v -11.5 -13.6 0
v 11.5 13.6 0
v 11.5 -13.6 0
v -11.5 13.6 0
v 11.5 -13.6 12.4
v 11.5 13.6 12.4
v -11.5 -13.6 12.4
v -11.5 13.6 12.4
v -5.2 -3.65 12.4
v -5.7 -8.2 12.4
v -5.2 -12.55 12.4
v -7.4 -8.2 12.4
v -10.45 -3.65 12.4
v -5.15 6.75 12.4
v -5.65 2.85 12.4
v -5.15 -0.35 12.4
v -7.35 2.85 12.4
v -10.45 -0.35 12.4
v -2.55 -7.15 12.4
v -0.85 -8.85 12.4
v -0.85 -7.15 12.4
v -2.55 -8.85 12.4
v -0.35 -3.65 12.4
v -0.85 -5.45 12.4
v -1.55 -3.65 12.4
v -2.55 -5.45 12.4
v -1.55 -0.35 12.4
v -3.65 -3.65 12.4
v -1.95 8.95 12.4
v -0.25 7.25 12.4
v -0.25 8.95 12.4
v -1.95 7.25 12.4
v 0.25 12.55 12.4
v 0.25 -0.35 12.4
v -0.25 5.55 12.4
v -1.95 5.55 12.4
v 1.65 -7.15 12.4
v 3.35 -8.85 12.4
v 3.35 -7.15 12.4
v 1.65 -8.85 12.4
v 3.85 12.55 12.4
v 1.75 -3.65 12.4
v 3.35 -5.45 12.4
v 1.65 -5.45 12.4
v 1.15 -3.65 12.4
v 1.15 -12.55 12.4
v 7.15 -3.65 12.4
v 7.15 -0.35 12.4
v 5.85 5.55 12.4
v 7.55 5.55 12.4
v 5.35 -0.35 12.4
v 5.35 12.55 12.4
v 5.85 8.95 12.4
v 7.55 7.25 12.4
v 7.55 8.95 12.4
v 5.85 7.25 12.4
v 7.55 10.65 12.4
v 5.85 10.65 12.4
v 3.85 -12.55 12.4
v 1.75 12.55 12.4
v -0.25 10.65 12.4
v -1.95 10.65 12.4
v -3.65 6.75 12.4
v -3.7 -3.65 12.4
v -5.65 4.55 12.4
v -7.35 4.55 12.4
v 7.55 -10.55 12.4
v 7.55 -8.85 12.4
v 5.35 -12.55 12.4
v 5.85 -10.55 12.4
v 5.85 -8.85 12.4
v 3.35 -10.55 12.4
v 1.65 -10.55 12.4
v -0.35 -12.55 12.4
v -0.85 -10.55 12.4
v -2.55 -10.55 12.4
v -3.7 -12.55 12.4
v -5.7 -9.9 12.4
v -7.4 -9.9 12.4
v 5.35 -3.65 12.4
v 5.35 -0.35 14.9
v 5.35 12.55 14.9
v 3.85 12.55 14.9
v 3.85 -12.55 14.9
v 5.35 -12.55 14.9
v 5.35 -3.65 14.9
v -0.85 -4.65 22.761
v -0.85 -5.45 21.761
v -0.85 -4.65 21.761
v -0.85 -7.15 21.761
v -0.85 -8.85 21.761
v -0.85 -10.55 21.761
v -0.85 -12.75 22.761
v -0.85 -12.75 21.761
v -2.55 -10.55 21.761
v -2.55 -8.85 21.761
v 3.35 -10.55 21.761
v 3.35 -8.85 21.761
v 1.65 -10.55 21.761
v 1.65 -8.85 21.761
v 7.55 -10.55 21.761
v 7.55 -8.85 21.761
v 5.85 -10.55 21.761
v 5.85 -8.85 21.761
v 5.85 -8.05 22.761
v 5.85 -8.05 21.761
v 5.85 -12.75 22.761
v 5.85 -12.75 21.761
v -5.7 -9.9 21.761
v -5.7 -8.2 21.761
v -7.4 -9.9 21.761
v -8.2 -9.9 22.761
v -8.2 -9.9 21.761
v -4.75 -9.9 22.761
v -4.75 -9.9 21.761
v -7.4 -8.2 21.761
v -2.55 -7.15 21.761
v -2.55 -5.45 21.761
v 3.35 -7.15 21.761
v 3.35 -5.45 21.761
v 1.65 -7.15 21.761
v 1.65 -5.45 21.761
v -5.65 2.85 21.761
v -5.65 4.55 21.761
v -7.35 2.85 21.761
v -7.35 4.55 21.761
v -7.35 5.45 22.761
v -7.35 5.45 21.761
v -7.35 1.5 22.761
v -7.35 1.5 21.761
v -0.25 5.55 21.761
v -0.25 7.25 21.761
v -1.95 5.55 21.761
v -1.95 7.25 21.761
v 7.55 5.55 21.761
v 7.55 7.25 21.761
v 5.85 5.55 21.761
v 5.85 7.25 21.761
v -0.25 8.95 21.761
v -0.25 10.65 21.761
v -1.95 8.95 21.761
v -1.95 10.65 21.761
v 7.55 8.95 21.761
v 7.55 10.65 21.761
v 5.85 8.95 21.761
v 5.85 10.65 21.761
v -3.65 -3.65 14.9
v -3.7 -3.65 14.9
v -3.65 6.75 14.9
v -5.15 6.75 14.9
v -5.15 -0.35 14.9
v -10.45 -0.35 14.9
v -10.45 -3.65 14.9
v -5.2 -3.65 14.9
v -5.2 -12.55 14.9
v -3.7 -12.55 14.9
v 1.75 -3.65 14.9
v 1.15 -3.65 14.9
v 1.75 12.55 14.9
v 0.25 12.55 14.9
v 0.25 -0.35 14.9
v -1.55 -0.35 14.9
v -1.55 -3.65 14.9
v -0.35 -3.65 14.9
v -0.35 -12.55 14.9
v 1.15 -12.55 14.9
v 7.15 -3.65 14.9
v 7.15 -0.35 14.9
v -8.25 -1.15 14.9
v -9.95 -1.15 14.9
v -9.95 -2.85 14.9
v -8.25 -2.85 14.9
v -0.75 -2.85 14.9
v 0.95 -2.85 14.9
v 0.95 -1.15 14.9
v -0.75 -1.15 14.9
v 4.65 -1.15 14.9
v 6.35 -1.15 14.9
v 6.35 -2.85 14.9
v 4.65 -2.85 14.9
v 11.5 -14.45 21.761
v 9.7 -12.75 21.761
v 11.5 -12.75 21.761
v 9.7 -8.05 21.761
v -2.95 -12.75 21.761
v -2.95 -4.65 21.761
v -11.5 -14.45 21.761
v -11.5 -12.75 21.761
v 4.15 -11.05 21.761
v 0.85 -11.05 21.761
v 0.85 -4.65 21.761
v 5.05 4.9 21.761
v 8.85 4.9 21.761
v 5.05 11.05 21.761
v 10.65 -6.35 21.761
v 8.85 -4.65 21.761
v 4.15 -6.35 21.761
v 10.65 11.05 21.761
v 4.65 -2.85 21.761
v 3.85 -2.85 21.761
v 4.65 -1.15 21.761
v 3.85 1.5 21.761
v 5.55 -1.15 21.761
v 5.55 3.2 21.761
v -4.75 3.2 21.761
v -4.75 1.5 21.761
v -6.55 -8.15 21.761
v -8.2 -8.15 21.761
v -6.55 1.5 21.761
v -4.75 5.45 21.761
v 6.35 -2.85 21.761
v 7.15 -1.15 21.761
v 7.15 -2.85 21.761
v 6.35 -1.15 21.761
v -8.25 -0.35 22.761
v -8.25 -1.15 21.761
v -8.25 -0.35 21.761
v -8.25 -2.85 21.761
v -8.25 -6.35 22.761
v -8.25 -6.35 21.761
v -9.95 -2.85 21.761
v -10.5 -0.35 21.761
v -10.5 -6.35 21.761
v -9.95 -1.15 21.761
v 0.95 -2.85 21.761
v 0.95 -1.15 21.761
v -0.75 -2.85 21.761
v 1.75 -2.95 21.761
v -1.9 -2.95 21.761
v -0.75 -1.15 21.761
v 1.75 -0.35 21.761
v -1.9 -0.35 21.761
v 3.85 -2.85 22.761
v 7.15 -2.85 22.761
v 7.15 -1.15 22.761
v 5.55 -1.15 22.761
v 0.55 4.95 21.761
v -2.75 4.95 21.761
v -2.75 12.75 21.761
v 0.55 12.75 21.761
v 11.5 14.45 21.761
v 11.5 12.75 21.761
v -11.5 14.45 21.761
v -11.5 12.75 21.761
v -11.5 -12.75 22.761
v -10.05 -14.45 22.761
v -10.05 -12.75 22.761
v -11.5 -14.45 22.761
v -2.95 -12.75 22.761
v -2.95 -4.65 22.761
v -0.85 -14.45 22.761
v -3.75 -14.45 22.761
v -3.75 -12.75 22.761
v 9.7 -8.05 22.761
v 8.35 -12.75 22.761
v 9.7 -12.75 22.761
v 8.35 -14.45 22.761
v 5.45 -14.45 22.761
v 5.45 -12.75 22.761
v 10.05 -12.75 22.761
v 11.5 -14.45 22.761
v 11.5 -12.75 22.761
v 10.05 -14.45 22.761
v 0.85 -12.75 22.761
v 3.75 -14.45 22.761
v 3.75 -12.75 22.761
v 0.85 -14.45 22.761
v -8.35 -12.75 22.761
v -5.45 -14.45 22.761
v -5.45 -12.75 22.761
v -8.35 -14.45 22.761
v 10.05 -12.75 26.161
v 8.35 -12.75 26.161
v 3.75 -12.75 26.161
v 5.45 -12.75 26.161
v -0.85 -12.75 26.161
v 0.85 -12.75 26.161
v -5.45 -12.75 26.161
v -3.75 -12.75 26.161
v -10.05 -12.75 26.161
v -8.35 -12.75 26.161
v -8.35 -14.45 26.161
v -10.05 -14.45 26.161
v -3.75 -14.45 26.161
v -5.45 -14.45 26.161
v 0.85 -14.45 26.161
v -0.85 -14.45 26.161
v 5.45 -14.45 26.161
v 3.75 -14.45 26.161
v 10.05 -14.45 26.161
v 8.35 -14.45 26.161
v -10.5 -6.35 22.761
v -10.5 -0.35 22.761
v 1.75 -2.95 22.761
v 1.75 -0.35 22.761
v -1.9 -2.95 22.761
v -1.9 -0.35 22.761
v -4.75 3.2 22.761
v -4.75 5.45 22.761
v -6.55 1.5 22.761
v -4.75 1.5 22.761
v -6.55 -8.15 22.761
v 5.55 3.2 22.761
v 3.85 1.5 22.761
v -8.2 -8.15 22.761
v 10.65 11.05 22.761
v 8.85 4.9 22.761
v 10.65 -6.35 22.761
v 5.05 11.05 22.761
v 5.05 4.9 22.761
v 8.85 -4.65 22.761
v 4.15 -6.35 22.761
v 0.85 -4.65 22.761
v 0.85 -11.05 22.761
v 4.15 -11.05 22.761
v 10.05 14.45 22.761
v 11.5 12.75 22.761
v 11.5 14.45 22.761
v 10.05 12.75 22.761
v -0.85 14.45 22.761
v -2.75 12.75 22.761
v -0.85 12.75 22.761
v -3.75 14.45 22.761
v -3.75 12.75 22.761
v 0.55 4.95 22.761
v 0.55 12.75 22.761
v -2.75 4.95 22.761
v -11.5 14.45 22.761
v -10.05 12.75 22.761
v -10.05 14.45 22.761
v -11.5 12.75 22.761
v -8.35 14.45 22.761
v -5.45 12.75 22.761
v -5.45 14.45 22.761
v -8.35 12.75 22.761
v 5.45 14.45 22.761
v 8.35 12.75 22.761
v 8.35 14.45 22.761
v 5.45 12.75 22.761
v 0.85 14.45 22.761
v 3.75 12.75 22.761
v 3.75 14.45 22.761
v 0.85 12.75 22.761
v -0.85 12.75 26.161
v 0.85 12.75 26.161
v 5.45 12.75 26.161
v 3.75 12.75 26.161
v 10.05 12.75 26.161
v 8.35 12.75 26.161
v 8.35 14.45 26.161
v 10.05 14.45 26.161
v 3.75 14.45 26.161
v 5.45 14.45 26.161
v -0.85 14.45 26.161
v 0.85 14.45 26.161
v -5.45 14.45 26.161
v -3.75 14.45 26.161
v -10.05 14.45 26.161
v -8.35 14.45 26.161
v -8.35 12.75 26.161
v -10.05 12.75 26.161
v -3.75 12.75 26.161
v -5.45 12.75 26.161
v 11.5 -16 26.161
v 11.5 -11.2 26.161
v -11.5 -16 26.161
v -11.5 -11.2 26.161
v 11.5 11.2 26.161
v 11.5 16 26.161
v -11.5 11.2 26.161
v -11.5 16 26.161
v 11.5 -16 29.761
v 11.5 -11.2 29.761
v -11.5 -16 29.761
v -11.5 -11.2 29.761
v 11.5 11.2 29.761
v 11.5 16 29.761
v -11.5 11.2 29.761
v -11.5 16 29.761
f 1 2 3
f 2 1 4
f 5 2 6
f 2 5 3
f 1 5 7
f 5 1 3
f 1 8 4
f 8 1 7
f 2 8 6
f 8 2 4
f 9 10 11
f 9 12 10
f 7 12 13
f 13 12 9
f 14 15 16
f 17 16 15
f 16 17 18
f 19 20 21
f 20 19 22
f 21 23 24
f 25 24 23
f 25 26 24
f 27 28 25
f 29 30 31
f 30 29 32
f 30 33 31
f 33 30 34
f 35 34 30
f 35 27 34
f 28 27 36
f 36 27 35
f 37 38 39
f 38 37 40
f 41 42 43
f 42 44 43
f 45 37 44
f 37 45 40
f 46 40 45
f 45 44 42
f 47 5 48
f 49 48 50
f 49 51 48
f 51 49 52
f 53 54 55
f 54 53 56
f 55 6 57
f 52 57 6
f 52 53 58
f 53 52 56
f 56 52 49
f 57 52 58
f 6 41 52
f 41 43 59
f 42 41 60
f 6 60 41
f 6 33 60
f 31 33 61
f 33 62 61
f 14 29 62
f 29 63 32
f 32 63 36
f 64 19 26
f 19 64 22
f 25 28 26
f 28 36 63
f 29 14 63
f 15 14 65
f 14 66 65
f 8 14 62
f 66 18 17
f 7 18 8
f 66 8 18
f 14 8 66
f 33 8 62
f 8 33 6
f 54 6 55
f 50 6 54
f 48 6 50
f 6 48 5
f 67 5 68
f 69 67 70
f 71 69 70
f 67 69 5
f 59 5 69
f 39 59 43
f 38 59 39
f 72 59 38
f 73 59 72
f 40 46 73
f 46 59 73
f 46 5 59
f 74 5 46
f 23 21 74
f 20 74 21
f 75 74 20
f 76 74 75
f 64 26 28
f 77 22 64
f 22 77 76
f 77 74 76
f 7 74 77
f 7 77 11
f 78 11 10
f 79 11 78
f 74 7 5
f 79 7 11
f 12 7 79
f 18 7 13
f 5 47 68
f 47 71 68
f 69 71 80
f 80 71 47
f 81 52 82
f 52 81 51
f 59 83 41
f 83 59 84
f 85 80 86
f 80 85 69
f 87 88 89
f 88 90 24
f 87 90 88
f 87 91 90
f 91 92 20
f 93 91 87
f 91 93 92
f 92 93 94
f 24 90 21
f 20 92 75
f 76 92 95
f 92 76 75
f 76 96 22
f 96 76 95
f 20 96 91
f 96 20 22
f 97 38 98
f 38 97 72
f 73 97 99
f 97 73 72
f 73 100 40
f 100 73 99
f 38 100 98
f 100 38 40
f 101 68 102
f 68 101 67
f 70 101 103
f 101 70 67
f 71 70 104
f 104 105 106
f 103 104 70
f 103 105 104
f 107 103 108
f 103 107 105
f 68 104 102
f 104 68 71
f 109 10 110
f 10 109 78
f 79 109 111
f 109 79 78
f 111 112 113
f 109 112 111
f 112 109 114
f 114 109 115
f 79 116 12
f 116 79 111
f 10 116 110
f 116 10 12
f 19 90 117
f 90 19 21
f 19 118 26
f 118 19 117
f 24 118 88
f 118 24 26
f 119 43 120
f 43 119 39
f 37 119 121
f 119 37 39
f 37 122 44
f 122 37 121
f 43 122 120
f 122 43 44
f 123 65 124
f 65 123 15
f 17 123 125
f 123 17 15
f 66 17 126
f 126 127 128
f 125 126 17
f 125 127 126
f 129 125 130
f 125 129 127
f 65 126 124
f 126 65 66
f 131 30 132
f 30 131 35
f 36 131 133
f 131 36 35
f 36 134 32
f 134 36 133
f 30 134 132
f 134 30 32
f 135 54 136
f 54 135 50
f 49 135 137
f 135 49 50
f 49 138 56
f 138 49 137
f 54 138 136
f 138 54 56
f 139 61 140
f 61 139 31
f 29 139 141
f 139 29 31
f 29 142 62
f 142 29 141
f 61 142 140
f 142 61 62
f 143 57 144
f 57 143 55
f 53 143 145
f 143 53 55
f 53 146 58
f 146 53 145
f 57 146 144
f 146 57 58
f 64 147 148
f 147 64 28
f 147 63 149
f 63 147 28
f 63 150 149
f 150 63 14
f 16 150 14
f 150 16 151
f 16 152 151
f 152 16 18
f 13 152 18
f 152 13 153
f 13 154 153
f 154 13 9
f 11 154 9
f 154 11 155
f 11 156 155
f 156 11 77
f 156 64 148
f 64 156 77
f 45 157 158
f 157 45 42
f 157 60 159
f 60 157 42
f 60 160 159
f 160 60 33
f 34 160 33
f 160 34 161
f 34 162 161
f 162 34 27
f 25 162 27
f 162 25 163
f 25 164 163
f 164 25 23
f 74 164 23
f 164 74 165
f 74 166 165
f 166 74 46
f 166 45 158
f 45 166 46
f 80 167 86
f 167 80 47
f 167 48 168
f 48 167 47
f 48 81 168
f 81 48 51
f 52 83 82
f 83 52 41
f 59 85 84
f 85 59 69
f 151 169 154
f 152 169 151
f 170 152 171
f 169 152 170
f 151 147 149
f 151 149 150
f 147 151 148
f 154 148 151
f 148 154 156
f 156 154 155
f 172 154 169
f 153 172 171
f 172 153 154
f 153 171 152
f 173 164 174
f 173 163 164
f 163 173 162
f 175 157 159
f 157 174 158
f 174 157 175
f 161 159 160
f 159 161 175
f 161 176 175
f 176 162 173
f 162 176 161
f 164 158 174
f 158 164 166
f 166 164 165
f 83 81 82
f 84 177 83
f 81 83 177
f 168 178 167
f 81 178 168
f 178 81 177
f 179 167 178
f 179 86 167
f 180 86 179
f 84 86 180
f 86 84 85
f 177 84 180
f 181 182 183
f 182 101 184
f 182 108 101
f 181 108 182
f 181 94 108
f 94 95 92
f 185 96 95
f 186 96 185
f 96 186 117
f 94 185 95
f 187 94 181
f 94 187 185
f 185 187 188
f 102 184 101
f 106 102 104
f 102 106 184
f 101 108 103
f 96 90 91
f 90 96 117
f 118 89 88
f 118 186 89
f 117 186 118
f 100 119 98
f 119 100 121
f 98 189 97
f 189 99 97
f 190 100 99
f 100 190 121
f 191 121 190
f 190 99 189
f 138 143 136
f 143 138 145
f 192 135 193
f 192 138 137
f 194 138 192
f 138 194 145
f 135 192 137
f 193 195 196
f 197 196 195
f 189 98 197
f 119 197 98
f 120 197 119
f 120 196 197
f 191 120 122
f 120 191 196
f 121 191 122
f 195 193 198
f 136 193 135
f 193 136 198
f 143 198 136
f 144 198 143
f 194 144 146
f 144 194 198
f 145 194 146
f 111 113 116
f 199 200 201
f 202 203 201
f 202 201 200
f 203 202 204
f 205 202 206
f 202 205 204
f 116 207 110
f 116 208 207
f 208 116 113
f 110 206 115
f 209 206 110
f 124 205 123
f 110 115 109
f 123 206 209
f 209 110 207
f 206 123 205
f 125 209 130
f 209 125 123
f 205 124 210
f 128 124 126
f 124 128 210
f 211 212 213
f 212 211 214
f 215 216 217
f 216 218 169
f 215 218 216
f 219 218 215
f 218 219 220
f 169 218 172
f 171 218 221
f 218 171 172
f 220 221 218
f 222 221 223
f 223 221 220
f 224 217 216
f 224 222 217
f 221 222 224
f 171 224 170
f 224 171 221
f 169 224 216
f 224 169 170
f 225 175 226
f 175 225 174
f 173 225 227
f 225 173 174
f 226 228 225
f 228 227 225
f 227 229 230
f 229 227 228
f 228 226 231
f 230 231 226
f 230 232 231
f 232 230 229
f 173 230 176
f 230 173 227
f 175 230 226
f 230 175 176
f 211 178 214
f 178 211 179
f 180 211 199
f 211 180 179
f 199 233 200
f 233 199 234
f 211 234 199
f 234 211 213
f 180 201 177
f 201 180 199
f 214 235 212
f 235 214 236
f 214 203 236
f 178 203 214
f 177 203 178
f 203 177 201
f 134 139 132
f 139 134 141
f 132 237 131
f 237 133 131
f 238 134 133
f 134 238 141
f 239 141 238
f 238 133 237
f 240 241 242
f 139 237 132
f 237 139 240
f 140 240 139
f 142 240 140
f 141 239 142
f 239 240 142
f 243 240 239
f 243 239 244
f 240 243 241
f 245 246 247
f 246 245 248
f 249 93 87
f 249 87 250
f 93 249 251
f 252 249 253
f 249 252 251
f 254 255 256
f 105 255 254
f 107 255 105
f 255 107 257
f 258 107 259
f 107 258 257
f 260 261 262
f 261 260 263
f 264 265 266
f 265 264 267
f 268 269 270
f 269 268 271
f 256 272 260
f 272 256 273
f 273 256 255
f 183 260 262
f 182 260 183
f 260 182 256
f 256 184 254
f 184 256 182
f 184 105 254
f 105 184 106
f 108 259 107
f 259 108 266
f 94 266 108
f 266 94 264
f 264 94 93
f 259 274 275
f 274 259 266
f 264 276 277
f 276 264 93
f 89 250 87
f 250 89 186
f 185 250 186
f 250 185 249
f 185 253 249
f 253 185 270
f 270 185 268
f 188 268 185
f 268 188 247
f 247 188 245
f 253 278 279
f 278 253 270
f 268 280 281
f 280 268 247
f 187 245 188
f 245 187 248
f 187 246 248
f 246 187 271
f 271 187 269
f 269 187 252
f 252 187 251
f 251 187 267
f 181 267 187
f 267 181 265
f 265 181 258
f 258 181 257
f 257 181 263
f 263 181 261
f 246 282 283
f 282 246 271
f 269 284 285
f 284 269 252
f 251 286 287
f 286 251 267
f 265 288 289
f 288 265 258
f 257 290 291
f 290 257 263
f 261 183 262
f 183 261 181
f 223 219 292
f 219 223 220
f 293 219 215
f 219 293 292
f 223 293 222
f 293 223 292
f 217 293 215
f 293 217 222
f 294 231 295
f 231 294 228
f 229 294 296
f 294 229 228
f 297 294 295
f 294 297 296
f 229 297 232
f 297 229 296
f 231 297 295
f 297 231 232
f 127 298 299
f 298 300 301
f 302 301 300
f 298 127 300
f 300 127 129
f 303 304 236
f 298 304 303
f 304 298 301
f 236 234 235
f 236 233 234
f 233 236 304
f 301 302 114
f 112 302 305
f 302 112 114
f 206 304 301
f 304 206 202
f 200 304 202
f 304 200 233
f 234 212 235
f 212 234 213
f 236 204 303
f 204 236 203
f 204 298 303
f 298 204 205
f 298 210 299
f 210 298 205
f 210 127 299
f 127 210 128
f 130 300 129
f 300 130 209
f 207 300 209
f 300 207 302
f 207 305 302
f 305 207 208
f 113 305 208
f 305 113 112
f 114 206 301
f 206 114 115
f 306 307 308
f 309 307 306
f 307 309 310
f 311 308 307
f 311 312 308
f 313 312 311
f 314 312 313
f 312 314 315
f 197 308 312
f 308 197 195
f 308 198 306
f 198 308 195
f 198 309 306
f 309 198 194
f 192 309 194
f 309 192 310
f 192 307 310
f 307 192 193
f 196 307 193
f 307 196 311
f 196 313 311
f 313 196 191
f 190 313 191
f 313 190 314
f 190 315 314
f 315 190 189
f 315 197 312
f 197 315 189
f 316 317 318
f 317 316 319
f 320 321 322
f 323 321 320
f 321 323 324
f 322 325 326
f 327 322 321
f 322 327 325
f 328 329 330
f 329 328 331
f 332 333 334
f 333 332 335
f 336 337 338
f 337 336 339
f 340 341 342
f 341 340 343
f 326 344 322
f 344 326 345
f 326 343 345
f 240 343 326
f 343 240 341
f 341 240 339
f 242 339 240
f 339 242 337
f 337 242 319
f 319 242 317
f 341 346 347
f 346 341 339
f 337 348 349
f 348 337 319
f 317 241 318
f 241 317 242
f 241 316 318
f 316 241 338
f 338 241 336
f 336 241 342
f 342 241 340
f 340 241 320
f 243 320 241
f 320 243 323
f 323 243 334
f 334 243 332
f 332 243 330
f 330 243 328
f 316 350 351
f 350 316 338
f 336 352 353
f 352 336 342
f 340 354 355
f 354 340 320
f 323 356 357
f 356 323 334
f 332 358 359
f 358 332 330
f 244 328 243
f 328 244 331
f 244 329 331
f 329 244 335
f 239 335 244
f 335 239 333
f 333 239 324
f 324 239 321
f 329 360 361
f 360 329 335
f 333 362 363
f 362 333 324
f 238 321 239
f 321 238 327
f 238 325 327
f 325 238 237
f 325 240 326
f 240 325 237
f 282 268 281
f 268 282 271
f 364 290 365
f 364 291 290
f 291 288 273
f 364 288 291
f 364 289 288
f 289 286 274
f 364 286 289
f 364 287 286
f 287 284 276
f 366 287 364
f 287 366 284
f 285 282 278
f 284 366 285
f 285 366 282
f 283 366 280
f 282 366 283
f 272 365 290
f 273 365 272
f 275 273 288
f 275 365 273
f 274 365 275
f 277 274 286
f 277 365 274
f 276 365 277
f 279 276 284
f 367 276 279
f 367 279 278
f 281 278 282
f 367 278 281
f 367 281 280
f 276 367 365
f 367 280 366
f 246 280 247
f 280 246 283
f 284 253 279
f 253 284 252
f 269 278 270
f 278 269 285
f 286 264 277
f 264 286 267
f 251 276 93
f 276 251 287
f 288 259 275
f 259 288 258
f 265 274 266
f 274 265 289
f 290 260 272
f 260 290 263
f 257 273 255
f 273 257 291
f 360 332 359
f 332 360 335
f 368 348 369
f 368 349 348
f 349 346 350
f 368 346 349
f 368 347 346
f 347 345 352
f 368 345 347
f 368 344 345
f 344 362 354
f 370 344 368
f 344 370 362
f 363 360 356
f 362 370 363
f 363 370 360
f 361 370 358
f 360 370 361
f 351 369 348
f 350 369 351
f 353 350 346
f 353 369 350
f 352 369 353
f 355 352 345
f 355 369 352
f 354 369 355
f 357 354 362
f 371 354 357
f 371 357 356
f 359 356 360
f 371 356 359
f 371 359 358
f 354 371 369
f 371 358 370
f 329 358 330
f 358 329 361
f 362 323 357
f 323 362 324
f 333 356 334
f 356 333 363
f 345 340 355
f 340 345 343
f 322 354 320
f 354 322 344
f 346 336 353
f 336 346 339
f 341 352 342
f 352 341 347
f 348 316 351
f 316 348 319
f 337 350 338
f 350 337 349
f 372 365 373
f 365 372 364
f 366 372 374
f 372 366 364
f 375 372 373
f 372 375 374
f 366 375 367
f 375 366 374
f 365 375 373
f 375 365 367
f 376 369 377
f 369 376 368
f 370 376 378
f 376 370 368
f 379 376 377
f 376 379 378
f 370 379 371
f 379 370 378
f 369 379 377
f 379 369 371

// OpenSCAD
// Generated by SolidPython 0.4.2 on 2020-09-29 23:21:09
//!OpenSCAD

scale(v = 0.0100000000) {
	translate(v = [-1150, -1360, 0]) {
		union() {
			color(c = [0.4000000000, 0.4000000000, 0.4000000000]) {
				translate(v = [0, 0, 0]) {
					linear_extrude(height = 1000.0000000000) {
						polygon(paths = [[0, 1, 2, 3]], points = [[0, 0], [0, 2720], [2300, 2720], [2300, 0]]);
					}
				}
			}
			color(c = [0.2000000000, 0.6000000000, 0.2000000000]) {
				translate(v = [0, 0, 1000.0000000000]) {
					linear_extrude(height = 120.0000000000) {
						polygon(paths = [[0, 1, 2, 3]], points = [[0, 1305], [0, 2720], [2300, 2720], [2300, 1305]]);
					}
				}
			}
			color(c = [0.4000000000, 0.4000000000, 0.4000000000]) {
				translate(v = [0, 0, 1000.0000000000]) {
					linear_extrude(height = 120.0000000000) {
						polygon(paths = [[0, 1, 2, 3]], points = [[0, 0], [0, 1305], [2300, 1305], [2300, 0]]);
					}
				}
			}
			color(c = [0.9000000000, 0.6000000000, 0.6000000000]) {
				translate(v = [0, 0, 1120.0000000000]) {
					linear_extrude(height = 120.0000000000) {
						polygon(paths = [[0, 1, 2, 3]], points = [[375, 1485], [375, 1905], [635, 1905], [635, 1485]]);
					}
				}
			}
			color(c = [0.9000000000, 0.6000000000, 0.6000000000]) {
				translate(v = [0, 0, 1120.0000000000]) {
					linear_extrude(height = 120.0000000000) {
						polygon(paths = [[0, 1, 2, 3, 4, 5]], points = [[785, 1485], [785, 1905], [915, 1905], [915, 2485], [1175, 2485], [1175, 1485]]);
					}
				}
			}
			color(c = [0.9000000000, 0.6000000000, 0.6000000000]) {
				translate(v = [0, 0, 1120.0000000000]) {
					linear_extrude(height = 120.0000000000) {
						polygon(paths = [[0, 1, 2, 3]], points = [[1325, 1485], [1325, 2485], [1535, 2485], [1535, 1485]]);
					}
				}
			}
			color(c = [0.9000000000, 0.6000000000, 0.6000000000]) {
				translate(v = [0, 0, 1120.0000000000]) {
					linear_extrude(height = 120.0000000000) {
						polygon(paths = [[0, 1, 2, 3]], points = [[1685, 1485], [1685, 2485], [1945, 2485], [1945, 1485]]);
					}
				}
			}
			color(c = [0.9000000000, 0.6000000000, 0.9000000000]) {
				translate(v = [0, 0, 1120.0000000000]) {
					linear_extrude(height = 120.0000000000) {
						polygon(paths = [[0, 1, 2, 3]], points = [[370, 235], [370, 655], [630, 655], [630, 235]]);
					}
				}
			}
			color(c = [0.9000000000, 0.6000000000, 0.9000000000]) {
				translate(v = [0, 0, 1120.0000000000]) {
					linear_extrude(height = 120.0000000000) {
						polygon(paths = [[0, 1, 2, 3, 4, 5]], points = [[780, 235], [780, 655], [855, 655], [855, 885], [1115, 885], [1115, 235]]);
					}
				}
			}
			color(c = [0.9000000000, 0.6000000000, 0.9000000000]) {
				translate(v = [0, 0, 1120.0000000000]) {
					linear_extrude(height = 120.0000000000) {
						polygon(paths = [[0, 1, 2, 3]], points = [[1265, 235], [1265, 885], [1535, 885], [1535, 235]]);
					}
				}
			}
			color(c = [0.9000000000, 0.6000000000, 0.9000000000]) {
				translate(v = [0, 0, 1120.0000000000]) {
					linear_extrude(height = 120.0000000000) {
						polygon(paths = [[0, 1, 2, 3]], points = [[1685, 235], [1685, 885], [1945, 885], [1945, 235]]);
					}
				}
			}
			color(c = [0.2000000000, 0.6000000000, 0.2000000000]) {
				translate(v = [0, 0, 1120.0000000000]) {
					linear_extrude(height = 120.0000000000) {
						difference() {
							polygon(paths = [[0, 1, 2, 3]], points = [[0, 1305], [0, 2720], [2300, 2720], [2300, 1305]]);
							polygon(paths = [[0, 1, 2, 3]], points = [[375, 1485], [635, 1485], [635, 1905], [375, 1905]]);
							polygon(paths = [[0, 1, 2, 3]], points = [[1325, 1485], [1535, 1485], [1535, 2485], [1325, 2485]]);
							polygon(paths = [[0, 1, 2, 3]], points = [[1685, 1485], [1945, 1485], [1945, 2485], [1685, 2485]]);
							polygon(paths = [[0, 1, 2, 3, 4, 5]], points = [[785, 1485], [1175, 1485], [1175, 2485], [915, 2485], [915, 1905], [785, 1905]]);
						}
					}
				}
			}
			color(c = [0.4000000000, 0.4000000000, 0.4000000000]) {
				translate(v = [0, 0, 1120.0000000000]) {
					linear_extrude(height = 120.0000000000) {
						difference() {
							polygon(paths = [[0, 1, 2, 3]], points = [[0, 0], [0, 1305], [2300, 1305], [2300, 0]]);
							polygon(paths = [[0, 1, 2, 3]], points = [[370, 235], [630, 235], [630, 655], [370, 655]]);
							polygon(paths = [[0, 1, 2, 3]], points = [[1265, 235], [1535, 235], [1535, 885], [1265, 885]]);
							polygon(paths = [[0, 1, 2, 3]], points = [[1685, 235], [1945, 235], [1945, 885], [1685, 885]]);
							polygon(paths = [[0, 1, 2, 3, 4, 5]], points = [[780, 235], [1115, 235], [1115, 885], [855, 885], [855, 655], [780, 655]]);
						}
					}
				}
			}
			color(c = [0.1000000000, 0.1000000000, 0.1000000000]) {
				translate(v = [0, 0, 1240.0000000000]) {
					linear_extrude(height = 70.0000000000) {
						polygon(paths = [[0, 1, 2, 3]], points = [[895, 305], [895, 475], [1065, 475], [1065, 305]]);
					}
				}
			}
			color(c = [0.1000000000, 0.1000000000, 0.1000000000]) {
				translate(v = [0, 0, 1240.0000000000]) {
					linear_extrude(height = 70.0000000000) {
						polygon(paths = [[0, 1, 2, 3]], points = [[1315, 305], [1315, 475], [1485, 475], [1485, 305]]);
					}
				}
			}
			color(c = [0.1000000000, 0.1000000000, 0.1000000000]) {
				translate(v = [0, 0, 1240.0000000000]) {
					linear_extrude(height = 70.0000000000) {
						polygon(paths = [[0, 1, 2, 3]], points = [[1735, 305], [1735, 475], [1905, 475], [1905, 305]]);
					}
				}
			}
			color(c = [0.1000000000, 0.1000000000, 0.1000000000]) {
				translate(v = [0, 0, 1240.0000000000]) {
					linear_extrude(height = 70.0000000000) {
						polygon(paths = [[0, 1, 2, 3]], points = [[410, 370], [410, 540], [580, 540], [580, 370]]);
					}
				}
			}
			color(c = [0.1000000000, 0.1000000000, 0.1000000000]) {
				translate(v = [0, 0, 1240.0000000000]) {
					linear_extrude(height = 70.0000000000) {
						polygon(paths = [[0, 1, 2, 3]], points = [[895, 645], [895, 815], [1065, 815], [1065, 645]]);
					}
				}
			}
			color(c = [0.1000000000, 0.1000000000, 0.1000000000]) {
				translate(v = [0, 0, 1240.0000000000]) {
					linear_extrude(height = 70.0000000000) {
						polygon(paths = [[0, 1, 2, 3]], points = [[1315, 645], [1315, 815], [1485, 815], [1485, 645]]);
					}
				}
			}
			color(c = [0.1000000000, 0.1000000000, 0.1000000000]) {
				translate(v = [0, 0, 1240.0000000000]) {
					linear_extrude(height = 70.0000000000) {
						polygon(paths = [[0, 1, 2, 3]], points = [[415, 1645], [415, 1815], [585, 1815], [585, 1645]]);
					}
				}
			}
			color(c = [0.1000000000, 0.1000000000, 0.1000000000]) {
				translate(v = [0, 0, 1240.0000000000]) {
					linear_extrude(height = 70.0000000000) {
						polygon(paths = [[0, 1, 2, 3]], points = [[955, 1915], [955, 2085], [1125, 2085], [1125, 1915]]);
					}
				}
			}
			color(c = [0.1000000000, 0.1000000000, 0.1000000000]) {
				translate(v = [0, 0, 1240.0000000000]) {
					linear_extrude(height = 70.0000000000) {
						polygon(paths = [[0, 1, 2, 3]], points = [[1735, 1915], [1735, 2085], [1905, 2085], [1905, 1915]]);
					}
				}
			}
			color(c = [0.1000000000, 0.1000000000, 0.1000000000]) {
				translate(v = [0, 0, 1240.0000000000]) {
					linear_extrude(height = 70.0000000000) {
						polygon(paths = [[0, 1, 2, 3]], points = [[955, 2255], [955, 2425], [1125, 2425], [1125, 2255]]);
					}
				}
			}
			color(c = [0.1000000000, 0.1000000000, 0.1000000000]) {
				translate(v = [0, 0, 1240.0000000000]) {
					linear_extrude(height = 70.0000000000) {
						polygon(paths = [[0, 1, 2, 3]], points = [[1735, 2255], [1735, 2425], [1905, 2425], [1905, 2255]]);
					}
				}
			}
			color(c = [1.0000000000, 1.0000000000, 1.0000000000]) {
				translate(v = [0, 0, 1240.0000000000]) {
					linear_extrude(height = 70.0000000000) {
						polygon(paths = [[0, 1, 2, 3, 4, 5, 6, 7, 8, 9]], points = [[630, 105], [630, 995], [105, 995], [105, 1325], [635, 1325], [635, 2035], [785, 2035], [785, 995], [780, 995], [780, 105]]);
					}
				}
			}
			color(c = [1.0000000000, 1.0000000000, 1.0000000000]) {
				translate(v = [0, 0, 1240.0000000000]) {
					linear_extrude(height = 70.0000000000) {
						polygon(paths = [[0, 1, 2, 3, 4, 5, 6, 7, 8, 9]], points = [[1115, 105], [1115, 995], [995, 995], [995, 1325], [1175, 1325], [1175, 2615], [1325, 2615], [1325, 995], [1265, 995], [1265, 105]]);
					}
				}
			}
			color(c = [1.0000000000, 1.0000000000, 1.0000000000]) {
				translate(v = [0, 0, 1240.0000000000]) {
					linear_extrude(height = 70.0000000000) {
						polygon(paths = [[0, 1, 2, 3, 4, 5, 6, 7]], points = [[1535, 105], [1535, 2615], [1685, 2615], [1685, 1325], [1865, 1325], [1865, 995], [1685, 995], [1685, 105]]);
					}
				}
			}
			color(c = [0.1000000000, 0.1000000000, 0.1000000000]) {
				translate(v = [0, 0, 1310.0000000000]) {
					linear_extrude(height = 180.0000000000) {
						polygon(paths = [[0, 1, 2, 3]], points = [[895, 305], [895, 475], [1065, 475], [1065, 305]]);
					}
				}
			}
			color(c = [0.1000000000, 0.1000000000, 0.1000000000]) {
				translate(v = [0, 0, 1310.0000000000]) {
					linear_extrude(height = 180.0000000000) {
						polygon(paths = [[0, 1, 2, 3]], points = [[1315, 305], [1315, 475], [1485, 475], [1485, 305]]);
					}
				}
			}
			color(c = [0.1000000000, 0.1000000000, 0.1000000000]) {
				translate(v = [0, 0, 1310.0000000000]) {
					linear_extrude(height = 180.0000000000) {
						polygon(paths = [[0, 1, 2, 3]], points = [[1735, 305], [1735, 475], [1905, 475], [1905, 305]]);
					}
				}
			}
			color(c = [0.1000000000, 0.1000000000, 0.1000000000]) {
				translate(v = [0, 0, 1310.0000000000]) {
					linear_extrude(height = 180.0000000000) {
						polygon(paths = [[0, 1, 2, 3]], points = [[410, 370], [410, 540], [580, 540], [580, 370]]);
					}
				}
			}
			color(c = [0.1000000000, 0.1000000000, 0.1000000000]) {
				translate(v = [0, 0, 1310.0000000000]) {
					linear_extrude(height = 180.0000000000) {
						polygon(paths = [[0, 1, 2, 3]], points = [[895, 645], [895, 815], [1065, 815], [1065, 645]]);
					}
				}
			}
			color(c = [0.1000000000, 0.1000000000, 0.1000000000]) {
				translate(v = [0, 0, 1310.0000000000]) {
					linear_extrude(height = 180.0000000000) {
						polygon(paths = [[0, 1, 2, 3]], points = [[1315, 645], [1315, 815], [1485, 815], [1485, 645]]);
					}
				}
			}
			color(c = [0.1000000000, 0.1000000000, 0.1000000000]) {
				translate(v = [0, 0, 1310.0000000000]) {
					linear_extrude(height = 180.0000000000) {
						polygon(paths = [[0, 1, 2, 3]], points = [[415, 1645], [415, 1815], [585, 1815], [585, 1645]]);
					}
				}
			}
			color(c = [0.1000000000, 0.1000000000, 0.1000000000]) {
				translate(v = [0, 0, 1310.0000000000]) {
					linear_extrude(height = 180.0000000000) {
						polygon(paths = [[0, 1, 2, 3]], points = [[955, 1915], [955, 2085], [1125, 2085], [1125, 1915]]);
					}
				}
			}
			color(c = [0.1000000000, 0.1000000000, 0.1000000000]) {
				translate(v = [0, 0, 1310.0000000000]) {
					linear_extrude(height = 180.0000000000) {
						polygon(paths = [[0, 1, 2, 3]], points = [[1735, 1915], [1735, 2085], [1905, 2085], [1905, 1915]]);
					}
				}
			}
			color(c = [0.1000000000, 0.1000000000, 0.1000000000]) {
				translate(v = [0, 0, 1310.0000000000]) {
					linear_extrude(height = 180.0000000000) {
						polygon(paths = [[0, 1, 2, 3]], points = [[955, 2255], [955, 2425], [1125, 2425], [1125, 2255]]);
					}
				}
			}
			color(c = [0.1000000000, 0.1000000000, 0.1000000000]) {
				translate(v = [0, 0, 1310.0000000000]) {
					linear_extrude(height = 180.0000000000) {
						polygon(paths = [[0, 1, 2, 3]], points = [[1735, 2255], [1735, 2425], [1905, 2425], [1905, 2255]]);
					}
				}
			}
			color(c = [0.7000000000, 0, 0]) {
				translate(v = [0, 0, 1310.0000000000]) {
					linear_extrude(height = 180.0000000000) {
						polygon(paths = [[0, 1, 2, 3, 4, 5, 6, 7, 8, 9]], points = [[630, 105], [630, 995], [105, 995], [105, 1325], [635, 1325], [635, 2035], [785, 2035], [785, 995], [780, 995], [780, 105]]);
					}
				}
			}
			color(c = [0.7000000000, 0, 0]) {
				translate(v = [0, 0, 1310.0000000000]) {
					linear_extrude(height = 180.0000000000) {
						polygon(paths = [[0, 1, 2, 3, 4, 5, 6, 7, 8, 9]], points = [[1115, 105], [1115, 995], [995, 995], [995, 1325], [1175, 1325], [1175, 2615], [1325, 2615], [1325, 995], [1265, 995], [1265, 105]]);
					}
				}
			}
			color(c = [0.7000000000, 0, 0]) {
				translate(v = [0, 0, 1310.0000000000]) {
					linear_extrude(height = 180.0000000000) {
						polygon(paths = [[0, 1, 2, 3, 4, 5, 6, 7]], points = [[1535, 105], [1535, 2615], [1685, 2615], [1685, 1325], [1865, 1325], [1865, 995], [1685, 995], [1685, 105]]);
					}
				}
			}
			color(c = [0.1000000000, 0.1000000000, 0.1000000000]) {
				translate(v = [0, 0, 1490.0000000000]) {
					linear_extrude(height = 686.1000000000) {
						polygon(paths = [[0, 1, 2, 3]], points = [[895, 305], [895, 475], [1065, 475], [1065, 305]]);
					}
				}
			}
			color(c = [0.1000000000, 0.1000000000, 0.1000000000]) {
				translate(v = [0, 0, 1490.0000000000]) {
					linear_extrude(height = 686.1000000000) {
						polygon(paths = [[0, 1, 2, 3]], points = [[1315, 305], [1315, 475], [1485, 475], [1485, 305]]);
					}
				}
			}
			color(c = [0.1000000000, 0.1000000000, 0.1000000000]) {
				translate(v = [0, 0, 1490.0000000000]) {
					linear_extrude(height = 686.1000000000) {
						polygon(paths = [[0, 1, 2, 3]], points = [[1735, 305], [1735, 475], [1905, 475], [1905, 305]]);
					}
				}
			}
			color(c = [0.1000000000, 0.1000000000, 0.1000000000]) {
				translate(v = [0, 0, 1490.0000000000]) {
					linear_extrude(height = 686.1000000000) {
						polygon(paths = [[0, 1, 2, 3]], points = [[410, 370], [410, 540], [580, 540], [580, 370]]);
					}
				}
			}
			color(c = [0.1000000000, 0.1000000000, 0.1000000000]) {
				translate(v = [0, 0, 1490.0000000000]) {
					linear_extrude(height = 686.1000000000) {
						polygon(paths = [[0, 1, 2, 3]], points = [[895, 645], [895, 815], [1065, 815], [1065, 645]]);
					}
				}
			}
			color(c = [0.1000000000, 0.1000000000, 0.1000000000]) {
				translate(v = [0, 0, 1490.0000000000]) {
					linear_extrude(height = 686.1000000000) {
						polygon(paths = [[0, 1, 2, 3]], points = [[1315, 645], [1315, 815], [1485, 815], [1485, 645]]);
					}
				}
			}
			color(c = [0.1000000000, 0.1000000000, 0.1000000000]) {
				translate(v = [0, 0, 1490.0000000000]) {
					linear_extrude(height = 686.1000000000) {
						polygon(paths = [[0, 1, 2, 3]], points = [[155, 1075], [155, 1245], [325, 1245], [325, 1075]]);
					}
				}
			}
			color(c = [0.1000000000, 0.1000000000, 0.1000000000]) {
				translate(v = [0, 0, 1490.0000000000]) {
					linear_extrude(height = 686.1000000000) {
						polygon(paths = [[0, 1, 2, 3]], points = [[1075, 1075], [1075, 1245], [1245, 1245], [1245, 1075]]);
					}
				}
			}
			color(c = [0.1000000000, 0.1000000000, 0.1000000000]) {
				translate(v = [0, 0, 1490.0000000000]) {
					linear_extrude(height = 686.1000000000) {
						polygon(paths = [[0, 1, 2, 3]], points = [[1615, 1075], [1615, 1245], [1785, 1245], [1785, 1075]]);
					}
				}
			}
			color(c = [0.1000000000, 0.1000000000, 0.1000000000]) {
				translate(v = [0, 0, 1490.0000000000]) {
					linear_extrude(height = 686.1000000000) {
						polygon(paths = [[0, 1, 2, 3]], points = [[415, 1645], [415, 1815], [585, 1815], [585, 1645]]);
					}
				}
			}
			color(c = [0.1000000000, 0.1000000000, 0.1000000000]) {
				translate(v = [0, 0, 1490.0000000000]) {
					linear_extrude(height = 686.1000000000) {
						polygon(paths = [[0, 1, 2, 3]], points = [[955, 1915], [955, 2085], [1125, 2085], [1125, 1915]]);
					}
				}
			}
			color(c = [0.1000000000, 0.1000000000, 0.1000000000]) {
				translate(v = [0, 0, 1490.0000000000]) {
					linear_extrude(height = 686.1000000000) {
						polygon(paths = [[0, 1, 2, 3]], points = [[1735, 1915], [1735, 2085], [1905, 2085], [1905, 1915]]);
					}
				}
			}
			color(c = [0.1000000000, 0.1000000000, 0.1000000000]) {
				translate(v = [0, 0, 1490.0000000000]) {
					linear_extrude(height = 686.1000000000) {
						polygon(paths = [[0, 1, 2, 3]], points = [[955, 2255], [955, 2425], [1125, 2425], [1125, 2255]]);
					}
				}
			}
			color(c = [0.1000000000, 0.1000000000, 0.1000000000]) {
				translate(v = [0, 0, 1490.0000000000]) {
					linear_extrude(height = 686.1000000000) {
						polygon(paths = [[0, 1, 2, 3]], points = [[1735, 2255], [1735, 2425], [1905, 2425], [1905, 2255]]);
					}
				}
			}
			color(c = [0.9000000000, 0.6000000000, 0.6000000000]) {
				translate(v = [0, 0, 2176.1000000000]) {
					linear_extrude(height = 100.0000000000) {
						polygon(paths = [[0, 1, 2, 3, 4, 5, 6, 7, 8, 9, 10, 11]], points = [[0, -85], [0, 85], [855, 85], [855, 895], [1065, 895], [1065, 85], [1735, 85], [1735, 555], [2120, 555], [2120, 85], [2300, 85], [2300, -85]]);
					}
				}
			}
			color(c = [0.9000000000, 0.6000000000, 0.6000000000]) {
				translate(v = [0, 0, 2176.1000000000]) {
					linear_extrude(height = 100.0000000000) {
						polygon(paths = [[0, 1, 2, 3]], points = [[100, 725], [100, 1325], [325, 1325], [325, 725]]);
					}
				}
			}
			color(c = [0.9000000000, 0.6000000000, 0.6000000000]) {
				translate(v = [0, 0, 2176.1000000000]) {
					linear_extrude(height = 100.0000000000) {
						polygon(paths = [[0, 1, 2, 3]], points = [[960, 1065], [960, 1325], [1325, 1325], [1325, 1065]]);
					}
				}
			}
			color(c = [0.9000000000, 0.6000000000, 0.6000000000]) {
				translate(v = [0, 0, 2176.1000000000]) {
					linear_extrude(height = 100.0000000000) {
						polygon(paths = [[0, 1, 2, 3, 4, 5, 6, 7, 8, 9, 10, 11, 12, 13, 14, 15]], points = [[330, 370], [330, 545], [495, 545], [495, 1510], [415, 1510], [415, 1905], [675, 1905], [675, 1680], [1705, 1680], [1705, 1245], [1865, 1245], [1865, 1075], [1535, 1075], [1535, 1510], [675, 1510], [675, 370]]);
					}
				}
			}
			color(c = [0.9000000000, 0.6000000000, 0.6000000000]) {
				translate(v = [0, 0, 2176.1000000000]) {
					linear_extrude(height = 100.0000000000) {
						polygon(paths = [[0, 1, 2, 3, 4, 5, 6, 7, 8, 9]], points = [[1235, 255], [1235, 895], [2035, 895], [2035, 1850], [1655, 1850], [1655, 2465], [2215, 2465], [2215, 725], [1565, 725], [1565, 255]]);
					}
				}
			}
			color(c = [0.9000000000, 0.6000000000, 0.6000000000]) {
				translate(v = [0, 0, 2176.1000000000]) {
					linear_extrude(height = 100.0000000000) {
						polygon(paths = [[0, 1, 2, 3, 4, 5, 6, 7]], points = [[875, 1855], [875, 2635], [0, 2635], [0, 2805], [2300, 2805], [2300, 2635], [1205, 2635], [1205, 1855]]);
					}
				}
			}
			color(c = [0.5000000000, 0.5000000000, 0.5000000000]) {
				translate(v = [0, 0, 2276.1000000000]) {
					linear_extrude(height = 340.0000000000) {
						polygon(paths = [[0, 1, 2, 3]], points = [[145, -85], [145, 85], [315, 85], [315, -85]]);
					}
				}
			}
			color(c = [0.5000000000, 0.5000000000, 0.5000000000]) {
				translate(v = [0, 0, 2276.1000000000]) {
					linear_extrude(height = 340.0000000000) {
						polygon(paths = [[0, 1, 2, 3]], points = [[605, -85], [605, 85], [775, 85], [775, -85]]);
					}
				}
			}
			color(c = [0.5000000000, 0.5000000000, 0.5000000000]) {
				translate(v = [0, 0, 2276.1000000000]) {
					linear_extrude(height = 340.0000000000) {
						polygon(paths = [[0, 1, 2, 3]], points = [[1065, -85], [1065, 85], [1235, 85], [1235, -85]]);
					}
				}
			}
			color(c = [0.5000000000, 0.5000000000, 0.5000000000]) {
				translate(v = [0, 0, 2276.1000000000]) {
					linear_extrude(height = 340.0000000000) {
						polygon(paths = [[0, 1, 2, 3]], points = [[1525, -85], [1525, 85], [1695, 85], [1695, -85]]);
					}
				}
			}
			color(c = [0.5000000000, 0.5000000000, 0.5000000000]) {
				translate(v = [0, 0, 2276.1000000000]) {
					linear_extrude(height = 340.0000000000) {
						polygon(paths = [[0, 1, 2, 3]], points = [[1985, -85], [1985, 85], [2155, 85], [2155, -85]]);
					}
				}
			}
			color(c = [0.5000000000, 0.5000000000, 0.5000000000]) {
				translate(v = [0, 0, 2276.1000000000]) {
					linear_extrude(height = 340.0000000000) {
						polygon(paths = [[0, 1, 2, 3]], points = [[145, 2635], [145, 2805], [315, 2805], [315, 2635]]);
					}
				}
			}
			color(c = [0.5000000000, 0.5000000000, 0.5000000000]) {
				translate(v = [0, 0, 2276.1000000000]) {
					linear_extrude(height = 340.0000000000) {
						polygon(paths = [[0, 1, 2, 3]], points = [[605, 2635], [605, 2805], [775, 2805], [775, 2635]]);
					}
				}
			}
			color(c = [0.5000000000, 0.5000000000, 0.5000000000]) {
				translate(v = [0, 0, 2276.1000000000]) {
					linear_extrude(height = 340.0000000000) {
						polygon(paths = [[0, 1, 2, 3]], points = [[1065, 2635], [1065, 2805], [1235, 2805], [1235, 2635]]);
					}
				}
			}
			color(c = [0.5000000000, 0.5000000000, 0.5000000000]) {
				translate(v = [0, 0, 2276.1000000000]) {
					linear_extrude(height = 340.0000000000) {
						polygon(paths = [[0, 1, 2, 3]], points = [[1525, 2635], [1525, 2805], [1695, 2805], [1695, 2635]]);
					}
				}
			}
			color(c = [0.5000000000, 0.5000000000, 0.5000000000]) {
				translate(v = [0, 0, 2276.1000000000]) {
					linear_extrude(height = 340.0000000000) {
						polygon(paths = [[0, 1, 2, 3]], points = [[1985, 2635], [1985, 2805], [2155, 2805], [2155, 2635]]);
					}
				}
			}
			color(c = [0.3000000000, 0.3000000000, 1]) {
				translate(v = [0, 0, 2616.1000000000]) {
					linear_extrude(height = 360.0000000000) {
						polygon(paths = [[0, 1, 2, 3]], points = [[0, -240], [0, 240], [2300, 240], [2300, -240]]);
					}
				}
			}
			color(c = [0.3000000000, 0.3000000000, 1]) {
				translate(v = [0, 0, 2616.1000000000]) {
					linear_extrude(height = 360.0000000000) {
						polygon(paths = [[0, 1, 2, 3]], points = [[0, 2480], [0, 2960], [2300, 2960], [2300, 2480]]);
					}
				}
			}
		}
	}
}
